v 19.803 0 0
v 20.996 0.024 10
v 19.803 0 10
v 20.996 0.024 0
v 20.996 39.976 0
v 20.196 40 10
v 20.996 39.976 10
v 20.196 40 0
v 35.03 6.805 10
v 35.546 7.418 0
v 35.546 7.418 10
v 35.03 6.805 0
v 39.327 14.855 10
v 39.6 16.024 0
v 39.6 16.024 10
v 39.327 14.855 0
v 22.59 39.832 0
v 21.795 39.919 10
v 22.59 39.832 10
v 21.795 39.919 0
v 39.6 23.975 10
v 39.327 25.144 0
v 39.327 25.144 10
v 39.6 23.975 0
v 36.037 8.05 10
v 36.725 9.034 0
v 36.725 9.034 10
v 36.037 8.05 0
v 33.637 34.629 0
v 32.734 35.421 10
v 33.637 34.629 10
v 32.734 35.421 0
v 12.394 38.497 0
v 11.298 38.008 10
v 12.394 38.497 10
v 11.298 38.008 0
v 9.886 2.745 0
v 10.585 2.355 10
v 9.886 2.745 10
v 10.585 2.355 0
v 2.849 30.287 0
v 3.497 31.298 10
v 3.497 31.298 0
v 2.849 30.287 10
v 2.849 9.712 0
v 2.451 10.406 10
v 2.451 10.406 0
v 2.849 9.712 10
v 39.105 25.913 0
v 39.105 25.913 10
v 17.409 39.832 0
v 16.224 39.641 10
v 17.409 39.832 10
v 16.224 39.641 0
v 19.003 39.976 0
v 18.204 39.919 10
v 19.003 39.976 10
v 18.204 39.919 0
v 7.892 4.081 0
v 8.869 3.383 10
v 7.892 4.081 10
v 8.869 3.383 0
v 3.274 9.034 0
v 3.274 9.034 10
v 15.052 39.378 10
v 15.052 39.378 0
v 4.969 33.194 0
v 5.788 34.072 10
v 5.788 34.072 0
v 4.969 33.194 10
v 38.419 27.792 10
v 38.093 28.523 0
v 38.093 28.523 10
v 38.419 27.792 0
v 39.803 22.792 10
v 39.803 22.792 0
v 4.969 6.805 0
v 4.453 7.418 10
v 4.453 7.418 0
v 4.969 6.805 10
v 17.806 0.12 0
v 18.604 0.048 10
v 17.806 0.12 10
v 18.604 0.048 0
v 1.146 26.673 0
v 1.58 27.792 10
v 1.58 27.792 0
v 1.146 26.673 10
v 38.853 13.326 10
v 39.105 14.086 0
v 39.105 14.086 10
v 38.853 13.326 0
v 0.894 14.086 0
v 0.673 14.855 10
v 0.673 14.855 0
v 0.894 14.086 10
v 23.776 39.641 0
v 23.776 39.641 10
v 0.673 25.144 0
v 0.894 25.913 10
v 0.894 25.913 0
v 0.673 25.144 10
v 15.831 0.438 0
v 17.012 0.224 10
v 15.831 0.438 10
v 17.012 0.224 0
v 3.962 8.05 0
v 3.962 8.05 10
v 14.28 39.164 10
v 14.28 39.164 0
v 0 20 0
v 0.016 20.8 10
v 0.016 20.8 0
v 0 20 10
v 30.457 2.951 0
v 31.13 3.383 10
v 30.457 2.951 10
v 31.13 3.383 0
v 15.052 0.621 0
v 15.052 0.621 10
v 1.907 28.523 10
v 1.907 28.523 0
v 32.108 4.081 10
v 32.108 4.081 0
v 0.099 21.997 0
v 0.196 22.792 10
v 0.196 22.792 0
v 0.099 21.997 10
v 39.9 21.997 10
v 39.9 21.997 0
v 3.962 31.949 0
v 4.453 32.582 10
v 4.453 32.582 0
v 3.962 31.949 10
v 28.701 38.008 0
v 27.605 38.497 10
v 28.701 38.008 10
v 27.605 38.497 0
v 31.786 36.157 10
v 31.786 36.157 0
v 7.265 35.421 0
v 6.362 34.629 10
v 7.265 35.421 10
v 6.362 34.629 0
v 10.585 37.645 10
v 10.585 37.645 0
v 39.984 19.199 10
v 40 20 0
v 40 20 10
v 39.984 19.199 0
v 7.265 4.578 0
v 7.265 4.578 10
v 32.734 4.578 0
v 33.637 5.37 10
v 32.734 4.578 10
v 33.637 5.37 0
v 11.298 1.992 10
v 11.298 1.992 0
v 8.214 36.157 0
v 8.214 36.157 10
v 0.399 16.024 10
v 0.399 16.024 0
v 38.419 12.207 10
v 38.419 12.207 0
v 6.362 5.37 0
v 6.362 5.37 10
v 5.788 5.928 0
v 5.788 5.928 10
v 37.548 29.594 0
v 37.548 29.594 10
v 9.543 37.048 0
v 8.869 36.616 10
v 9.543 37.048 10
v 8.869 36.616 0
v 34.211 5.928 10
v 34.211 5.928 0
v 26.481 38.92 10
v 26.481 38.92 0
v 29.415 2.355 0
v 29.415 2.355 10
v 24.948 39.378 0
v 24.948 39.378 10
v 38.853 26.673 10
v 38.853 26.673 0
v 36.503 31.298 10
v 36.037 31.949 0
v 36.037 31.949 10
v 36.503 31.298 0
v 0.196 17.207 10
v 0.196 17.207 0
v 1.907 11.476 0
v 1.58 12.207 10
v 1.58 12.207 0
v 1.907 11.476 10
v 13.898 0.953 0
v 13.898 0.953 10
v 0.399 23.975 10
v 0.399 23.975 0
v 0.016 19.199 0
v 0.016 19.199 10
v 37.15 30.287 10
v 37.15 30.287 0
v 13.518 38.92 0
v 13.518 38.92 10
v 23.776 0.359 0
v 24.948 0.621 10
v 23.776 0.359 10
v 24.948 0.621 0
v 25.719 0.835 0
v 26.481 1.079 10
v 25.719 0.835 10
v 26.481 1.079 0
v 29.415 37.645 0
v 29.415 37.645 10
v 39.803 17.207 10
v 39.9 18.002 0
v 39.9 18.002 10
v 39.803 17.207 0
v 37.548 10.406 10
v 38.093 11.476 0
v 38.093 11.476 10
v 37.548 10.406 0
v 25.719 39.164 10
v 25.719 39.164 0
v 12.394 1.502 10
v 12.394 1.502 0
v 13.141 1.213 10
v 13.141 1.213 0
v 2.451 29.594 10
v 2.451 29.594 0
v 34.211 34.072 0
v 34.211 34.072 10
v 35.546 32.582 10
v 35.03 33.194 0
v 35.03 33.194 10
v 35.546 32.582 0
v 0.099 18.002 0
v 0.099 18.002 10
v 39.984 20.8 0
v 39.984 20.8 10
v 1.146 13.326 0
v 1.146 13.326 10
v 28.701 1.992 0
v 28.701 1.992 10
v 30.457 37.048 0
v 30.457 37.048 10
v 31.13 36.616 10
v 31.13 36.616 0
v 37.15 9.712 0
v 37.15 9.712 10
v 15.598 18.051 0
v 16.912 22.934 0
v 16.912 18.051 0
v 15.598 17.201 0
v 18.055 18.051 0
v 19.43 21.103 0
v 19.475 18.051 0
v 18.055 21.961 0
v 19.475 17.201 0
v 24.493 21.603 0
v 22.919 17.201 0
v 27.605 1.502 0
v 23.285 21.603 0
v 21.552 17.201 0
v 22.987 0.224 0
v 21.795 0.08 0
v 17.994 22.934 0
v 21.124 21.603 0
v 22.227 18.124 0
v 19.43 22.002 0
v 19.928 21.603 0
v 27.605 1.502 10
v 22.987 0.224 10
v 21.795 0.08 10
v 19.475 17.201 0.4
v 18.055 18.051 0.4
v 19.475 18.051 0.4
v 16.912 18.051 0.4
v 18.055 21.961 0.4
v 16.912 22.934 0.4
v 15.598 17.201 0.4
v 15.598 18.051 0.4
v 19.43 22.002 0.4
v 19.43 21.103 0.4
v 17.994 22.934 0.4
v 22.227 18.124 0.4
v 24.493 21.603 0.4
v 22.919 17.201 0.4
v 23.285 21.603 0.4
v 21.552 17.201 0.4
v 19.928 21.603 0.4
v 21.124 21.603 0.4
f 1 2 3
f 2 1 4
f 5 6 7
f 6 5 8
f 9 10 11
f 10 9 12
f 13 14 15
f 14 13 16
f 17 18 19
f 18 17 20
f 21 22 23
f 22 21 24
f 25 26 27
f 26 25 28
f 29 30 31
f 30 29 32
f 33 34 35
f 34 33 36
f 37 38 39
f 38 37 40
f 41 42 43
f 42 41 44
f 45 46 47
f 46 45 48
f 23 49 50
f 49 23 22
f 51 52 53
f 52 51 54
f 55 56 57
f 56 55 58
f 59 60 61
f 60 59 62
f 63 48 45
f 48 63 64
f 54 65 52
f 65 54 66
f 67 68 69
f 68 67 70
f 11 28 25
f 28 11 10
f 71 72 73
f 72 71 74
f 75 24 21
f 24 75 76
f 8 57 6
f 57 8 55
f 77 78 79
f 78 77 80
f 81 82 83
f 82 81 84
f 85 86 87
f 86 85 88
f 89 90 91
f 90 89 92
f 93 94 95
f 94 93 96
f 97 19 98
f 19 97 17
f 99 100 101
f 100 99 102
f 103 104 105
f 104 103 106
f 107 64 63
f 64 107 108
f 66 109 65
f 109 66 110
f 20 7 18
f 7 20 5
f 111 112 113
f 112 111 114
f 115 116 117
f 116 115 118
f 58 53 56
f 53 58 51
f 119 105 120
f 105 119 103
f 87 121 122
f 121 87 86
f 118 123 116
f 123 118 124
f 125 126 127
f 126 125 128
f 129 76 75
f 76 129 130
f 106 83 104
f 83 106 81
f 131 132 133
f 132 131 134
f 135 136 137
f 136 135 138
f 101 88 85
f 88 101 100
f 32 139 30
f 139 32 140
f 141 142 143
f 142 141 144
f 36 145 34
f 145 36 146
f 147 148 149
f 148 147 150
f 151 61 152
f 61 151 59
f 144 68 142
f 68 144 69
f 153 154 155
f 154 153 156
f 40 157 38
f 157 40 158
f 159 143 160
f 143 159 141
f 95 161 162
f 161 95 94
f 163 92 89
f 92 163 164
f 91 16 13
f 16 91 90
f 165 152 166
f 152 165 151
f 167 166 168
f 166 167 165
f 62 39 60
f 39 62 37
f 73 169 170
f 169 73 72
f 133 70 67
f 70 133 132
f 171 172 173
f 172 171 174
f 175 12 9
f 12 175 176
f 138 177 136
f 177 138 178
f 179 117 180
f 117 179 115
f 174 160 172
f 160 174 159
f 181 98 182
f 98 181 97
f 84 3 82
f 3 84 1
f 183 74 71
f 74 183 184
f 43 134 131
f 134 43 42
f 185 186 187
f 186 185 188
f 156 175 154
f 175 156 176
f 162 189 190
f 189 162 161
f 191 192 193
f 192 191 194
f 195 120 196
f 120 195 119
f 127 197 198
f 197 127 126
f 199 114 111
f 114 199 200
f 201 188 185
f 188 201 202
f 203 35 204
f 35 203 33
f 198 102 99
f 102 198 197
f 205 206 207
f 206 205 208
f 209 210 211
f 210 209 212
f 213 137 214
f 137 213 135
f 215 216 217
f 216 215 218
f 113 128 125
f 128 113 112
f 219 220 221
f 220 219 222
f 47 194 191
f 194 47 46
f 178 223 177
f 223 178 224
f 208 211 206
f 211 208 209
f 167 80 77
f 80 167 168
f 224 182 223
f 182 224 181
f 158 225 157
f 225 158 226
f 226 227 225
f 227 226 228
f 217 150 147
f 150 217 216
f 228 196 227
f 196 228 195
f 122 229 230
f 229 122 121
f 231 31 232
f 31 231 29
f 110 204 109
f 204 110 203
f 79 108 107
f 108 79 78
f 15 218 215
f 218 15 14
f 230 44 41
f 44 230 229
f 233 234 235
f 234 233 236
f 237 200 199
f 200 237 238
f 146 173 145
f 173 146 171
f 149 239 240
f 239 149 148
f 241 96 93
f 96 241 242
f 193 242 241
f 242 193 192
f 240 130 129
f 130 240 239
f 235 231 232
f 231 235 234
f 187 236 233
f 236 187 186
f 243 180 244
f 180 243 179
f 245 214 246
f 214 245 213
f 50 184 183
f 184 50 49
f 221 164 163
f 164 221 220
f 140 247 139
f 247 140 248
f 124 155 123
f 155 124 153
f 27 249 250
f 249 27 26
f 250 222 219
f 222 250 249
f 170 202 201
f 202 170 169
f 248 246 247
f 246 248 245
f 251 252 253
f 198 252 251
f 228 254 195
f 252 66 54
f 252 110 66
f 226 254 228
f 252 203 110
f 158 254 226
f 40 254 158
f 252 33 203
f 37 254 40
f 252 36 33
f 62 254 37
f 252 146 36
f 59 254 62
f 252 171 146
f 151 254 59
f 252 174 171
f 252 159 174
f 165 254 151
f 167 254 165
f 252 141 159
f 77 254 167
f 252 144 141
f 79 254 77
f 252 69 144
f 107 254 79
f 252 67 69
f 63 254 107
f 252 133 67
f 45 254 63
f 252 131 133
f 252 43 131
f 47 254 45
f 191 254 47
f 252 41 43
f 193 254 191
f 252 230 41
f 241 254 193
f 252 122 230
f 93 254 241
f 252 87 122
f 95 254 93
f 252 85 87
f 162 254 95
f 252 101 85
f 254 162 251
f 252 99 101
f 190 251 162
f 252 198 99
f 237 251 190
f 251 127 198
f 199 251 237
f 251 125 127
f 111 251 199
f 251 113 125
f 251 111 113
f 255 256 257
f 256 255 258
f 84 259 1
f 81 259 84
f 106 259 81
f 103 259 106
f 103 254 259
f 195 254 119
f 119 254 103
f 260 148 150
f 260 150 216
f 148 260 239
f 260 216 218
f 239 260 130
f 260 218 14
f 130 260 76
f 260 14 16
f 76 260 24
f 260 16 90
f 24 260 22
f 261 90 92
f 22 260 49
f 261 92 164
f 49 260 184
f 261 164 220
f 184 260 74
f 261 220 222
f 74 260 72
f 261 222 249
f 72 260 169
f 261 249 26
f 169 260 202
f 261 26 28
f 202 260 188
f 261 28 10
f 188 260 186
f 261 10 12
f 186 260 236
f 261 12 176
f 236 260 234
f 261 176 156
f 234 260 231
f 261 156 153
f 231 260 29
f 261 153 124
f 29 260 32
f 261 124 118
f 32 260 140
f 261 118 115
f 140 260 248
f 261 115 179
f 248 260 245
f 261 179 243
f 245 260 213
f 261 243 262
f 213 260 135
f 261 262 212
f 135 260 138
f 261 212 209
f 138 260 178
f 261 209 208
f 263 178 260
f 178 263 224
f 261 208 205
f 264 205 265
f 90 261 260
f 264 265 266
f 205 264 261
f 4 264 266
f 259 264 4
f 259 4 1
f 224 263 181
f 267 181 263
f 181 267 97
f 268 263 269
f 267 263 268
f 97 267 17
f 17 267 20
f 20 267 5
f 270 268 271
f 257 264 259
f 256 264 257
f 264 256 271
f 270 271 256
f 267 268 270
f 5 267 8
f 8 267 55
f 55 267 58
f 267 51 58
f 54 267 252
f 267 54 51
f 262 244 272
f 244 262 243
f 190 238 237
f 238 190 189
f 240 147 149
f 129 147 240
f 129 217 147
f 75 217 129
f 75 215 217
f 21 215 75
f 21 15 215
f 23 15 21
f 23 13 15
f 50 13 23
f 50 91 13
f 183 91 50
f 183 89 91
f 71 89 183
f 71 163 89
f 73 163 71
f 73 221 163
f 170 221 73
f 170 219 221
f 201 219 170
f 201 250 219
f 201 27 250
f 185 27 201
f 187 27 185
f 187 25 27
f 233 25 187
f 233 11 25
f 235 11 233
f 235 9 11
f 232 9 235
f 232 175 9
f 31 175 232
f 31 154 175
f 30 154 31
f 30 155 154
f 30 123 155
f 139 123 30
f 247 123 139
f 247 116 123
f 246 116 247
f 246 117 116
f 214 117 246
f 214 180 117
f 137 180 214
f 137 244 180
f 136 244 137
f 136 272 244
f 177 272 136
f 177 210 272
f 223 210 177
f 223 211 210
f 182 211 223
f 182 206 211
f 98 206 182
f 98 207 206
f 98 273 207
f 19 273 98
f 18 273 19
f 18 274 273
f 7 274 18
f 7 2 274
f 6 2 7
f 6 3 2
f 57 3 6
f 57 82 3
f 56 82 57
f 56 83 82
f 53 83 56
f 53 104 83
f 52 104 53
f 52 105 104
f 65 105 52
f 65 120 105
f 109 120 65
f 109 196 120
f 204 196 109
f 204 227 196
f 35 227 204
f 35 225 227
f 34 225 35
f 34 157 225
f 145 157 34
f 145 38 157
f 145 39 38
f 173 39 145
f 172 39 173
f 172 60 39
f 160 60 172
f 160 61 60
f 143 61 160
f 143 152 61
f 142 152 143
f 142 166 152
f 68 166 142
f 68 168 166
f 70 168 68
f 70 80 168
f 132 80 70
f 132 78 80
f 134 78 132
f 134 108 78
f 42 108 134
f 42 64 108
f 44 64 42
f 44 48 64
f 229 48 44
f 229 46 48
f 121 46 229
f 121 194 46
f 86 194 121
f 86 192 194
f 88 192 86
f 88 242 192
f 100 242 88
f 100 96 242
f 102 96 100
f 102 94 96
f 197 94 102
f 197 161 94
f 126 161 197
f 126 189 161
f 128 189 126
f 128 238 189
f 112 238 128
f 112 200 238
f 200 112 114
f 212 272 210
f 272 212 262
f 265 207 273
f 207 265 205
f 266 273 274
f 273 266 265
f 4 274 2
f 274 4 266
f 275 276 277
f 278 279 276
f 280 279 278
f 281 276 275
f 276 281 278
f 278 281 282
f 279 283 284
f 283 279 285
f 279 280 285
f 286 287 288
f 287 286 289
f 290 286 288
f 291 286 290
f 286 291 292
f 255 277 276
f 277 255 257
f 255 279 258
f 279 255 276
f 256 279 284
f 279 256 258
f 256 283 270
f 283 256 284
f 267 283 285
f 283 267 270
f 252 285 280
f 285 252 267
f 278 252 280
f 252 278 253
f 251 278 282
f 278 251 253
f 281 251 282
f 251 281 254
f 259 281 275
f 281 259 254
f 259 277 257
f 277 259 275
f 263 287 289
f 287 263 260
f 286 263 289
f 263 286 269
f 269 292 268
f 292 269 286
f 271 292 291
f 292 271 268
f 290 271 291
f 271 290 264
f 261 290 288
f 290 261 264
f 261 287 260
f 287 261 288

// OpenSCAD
// test2 — generated by protobot from a sketch (input.jpg)
// 2026-10-27
//
// Print: Prusa Core One, 0.4 mm nozzle, PLA, 0.2 mm layers, flat on the bed.
// The outline is stored in a 0..1 unit box and scaled by LENGTH/WIDTH, so
// the three measurements below are all you need to change. Re-export with:
//   openscad --backend=manifold --export-format binstl -o test2.stl test2.scad
//
// Dimension tags: [M] = given by the user, [S] = traced from the sketch.

/* [Measurements] */
LENGTH    = 40;   // [M] X extent, mm
WIDTH     = 40;   // [M] Y extent, mm
THICKNESS = 10;   // [M] extrusion height, mm

/* [Edge finish] */
// Perimeter edges (outline AND holes), top and bottom faces.
// "fillet" = rounded, "chamfer" = 45°, "none" = sharp. Built in LAYER steps,
// i.e. exactly as the printer will lay it down.
EDGE_TOP_KIND    = "none";
EDGE_TOP         = 0;     // mm
EDGE_BOTTOM_KIND = "none";
EDGE_BOTTOM      = 0;     // mm
LAYER            = 0.2;   // mm, print layer height

/* [Version stamp] */
VERSION        = 1;       // bump every revision
VERSION_POS    = [0.5000, 0.5000];  // [S] unit-box spot deepest inside the shape
VERSION_SIZE   = 6;      // mm text height
VERSION_DEPTH  = 0.4;    // mm, 2 layers at 0.2

/* [Hidden] */
// [S] traced outline (+ holes), unit box, y up.
OUTLINE_PTS = [
    [0.49509,0.00000], [0.46510,0.00120], [0.44517,0.00300], [0.42532,0.00560], [0.39579,0.01097], [0.37631,0.01554],
    [0.34746,0.02383], [0.32853,0.03032], [0.30987,0.03756], [0.28247,0.04980], [0.26463,0.05887], [0.24716,0.06864],
    [0.22174,0.08459], [0.19731,0.10204], [0.18163,0.11447], [0.15907,0.13427], [0.14471,0.14820], [0.12424,0.17015],
    [0.11134,0.18545], [0.09907,0.20126], [0.08186,0.22585], [0.07123,0.24280], [0.06128,0.26016], [0.04768,0.28692],
    [0.03952,0.30519], [0.02866,0.33317], [0.02236,0.35216], [0.01683,0.37139], [0.00998,0.40061], [0.00490,0.43019],
    [0.00250,0.45006], [0.00040,0.47999], [0.00000,0.50000], [0.00040,0.52001], [0.00250,0.54994], [0.00490,0.56981],
    [0.00998,0.59939], [0.01683,0.62861], [0.02236,0.64784], [0.02866,0.66683], [0.03952,0.69481], [0.04768,0.71308],
    [0.06128,0.73984], [0.07123,0.75720], [0.08743,0.78246], [0.09907,0.79874], [0.11134,0.81455], [0.12424,0.82985],
    [0.14471,0.85180], [0.15907,0.86573], [0.18163,0.88553], [0.20534,0.90394], [0.22174,0.91541], [0.23858,0.92621],
    [0.26463,0.94113], [0.28247,0.95020], [0.30987,0.96244], [0.33796,0.97302], [0.35702,0.97912], [0.37631,0.98446],
    [0.40560,0.99102], [0.43523,0.99580], [0.45512,0.99800], [0.47509,0.99940], [0.50491,1.00000], [0.52491,0.99940],
    [0.54488,0.99800], [0.56477,0.99580], [0.59440,0.99102], [0.62369,0.98446], [0.64298,0.97912], [0.66204,0.97302],
    [0.69013,0.96244], [0.71753,0.95020], [0.73537,0.94113], [0.76142,0.92621], [0.77826,0.91541], [0.79466,0.90394],
    [0.81837,0.88553], [0.84093,0.86573], [0.85529,0.85180], [0.87576,0.82985], [0.88866,0.81455], [0.90093,0.79874],
    [0.91257,0.78246], [0.92877,0.75720], [0.93872,0.73984], [0.95232,0.71308], [0.96048,0.69481], [0.97134,0.66683],
    [0.97764,0.64784], [0.98317,0.62861], [0.99002,0.59939], [0.99510,0.56981], [0.99750,0.54994], [0.99960,0.52001],
    [1.00000,0.50000], [0.99960,0.47999], [0.99750,0.45006], [0.99510,0.43019], [0.99002,0.40061], [0.98317,0.37139],
    [0.97764,0.35216], [0.97134,0.33317], [0.96048,0.30519], [0.95232,0.28692], [0.93872,0.26016], [0.92877,0.24280],
    [0.91814,0.22585], [0.90093,0.20126], [0.88866,0.18545], [0.87576,0.17015], [0.85529,0.14820], [0.84093,0.13427],
    [0.81837,0.11447], [0.80269,0.10204], [0.77826,0.08459], [0.76142,0.07379], [0.73537,0.05887], [0.71753,0.04980],
    [0.69013,0.03756], [0.66204,0.02698], [0.64298,0.02088], [0.62369,0.01554], [0.59440,0.00898], [0.57468,0.00560],
    [0.54488,0.00200], [0.52491,0.00060]
];
OUTLINE_PATHS = [
    [for (i = [0:127]) i]
];

module outline_2d() {
    scale([LENGTH, WIDTH]) polygon(points = OUTLINE_PTS, paths = OUTLINE_PATHS);
}

// Debossed into the bottom face, mirrored so it reads from underneath.
module version_stamp() {
    if (!is_undef(VERSION_POS) && VERSION_SIZE > 0)
        translate([VERSION_POS[0] * LENGTH, VERSION_POS[1] * WIDTH, -0.01])
            linear_extrude(VERSION_DEPTH + 0.01)
                mirror([1, 0])
                    text(str("v", VERSION), size = VERSION_SIZE,
                         font = "Liberation Sans:style=Bold",
                         halign = "center", valign = "center");
}

// How far the outline is pulled in at depth d (0..r) into a finished edge.
function edge_inset(kind, r, d) =
    kind == "chamfer" ? max(0, r - d) :
    kind == "fillet"  ? r - sqrt(max(0, r * r - (r - min(d, r)) * (r - min(d, r)))) : 0;

module body() {
    nb = EDGE_BOTTOM_KIND == "none" ? 0 : ceil(EDGE_BOTTOM / LAYER - 1e-6);
    nt = EDGE_TOP_KIND    == "none" ? 0 : ceil(EDGE_TOP / LAYER - 1e-6);
    zb = nb * LAYER;
    zt = nt * LAYER;
    union() {
        // straight-walled core, overlapping the finished layers (no shared faces)
        translate([0, 0, zb - (nb > 0 ? 0.01 : 0)])
            linear_extrude(THICKNESS - zb - zt + (nb > 0 ? 0.01 : 0) + (nt > 0 ? 0.01 : 0))
                outline_2d();
        if (nb > 0) for (i = [0 : nb - 1])
            translate([0, 0, i * LAYER])
                linear_extrude(LAYER + 0.01)
                    offset(delta = -edge_inset(EDGE_BOTTOM_KIND, EDGE_BOTTOM, (i + 0.5) * LAYER))
                        outline_2d();
        if (nt > 0) for (i = [0 : nt - 1])
            translate([0, 0, THICKNESS - (i + 1) * LAYER - (i < nt - 1 ? 0.01 : 0)])
                linear_extrude(LAYER + (i < nt - 1 ? 0.01 : 0))
                    offset(delta = -edge_inset(EDGE_TOP_KIND, EDGE_TOP, (i + 0.5) * LAYER))
                        outline_2d();
    }
}

module part() {
    $fa = 2; $fs = 0.4;
    difference() {
        body();
        version_stamp();
    }
}

part();
